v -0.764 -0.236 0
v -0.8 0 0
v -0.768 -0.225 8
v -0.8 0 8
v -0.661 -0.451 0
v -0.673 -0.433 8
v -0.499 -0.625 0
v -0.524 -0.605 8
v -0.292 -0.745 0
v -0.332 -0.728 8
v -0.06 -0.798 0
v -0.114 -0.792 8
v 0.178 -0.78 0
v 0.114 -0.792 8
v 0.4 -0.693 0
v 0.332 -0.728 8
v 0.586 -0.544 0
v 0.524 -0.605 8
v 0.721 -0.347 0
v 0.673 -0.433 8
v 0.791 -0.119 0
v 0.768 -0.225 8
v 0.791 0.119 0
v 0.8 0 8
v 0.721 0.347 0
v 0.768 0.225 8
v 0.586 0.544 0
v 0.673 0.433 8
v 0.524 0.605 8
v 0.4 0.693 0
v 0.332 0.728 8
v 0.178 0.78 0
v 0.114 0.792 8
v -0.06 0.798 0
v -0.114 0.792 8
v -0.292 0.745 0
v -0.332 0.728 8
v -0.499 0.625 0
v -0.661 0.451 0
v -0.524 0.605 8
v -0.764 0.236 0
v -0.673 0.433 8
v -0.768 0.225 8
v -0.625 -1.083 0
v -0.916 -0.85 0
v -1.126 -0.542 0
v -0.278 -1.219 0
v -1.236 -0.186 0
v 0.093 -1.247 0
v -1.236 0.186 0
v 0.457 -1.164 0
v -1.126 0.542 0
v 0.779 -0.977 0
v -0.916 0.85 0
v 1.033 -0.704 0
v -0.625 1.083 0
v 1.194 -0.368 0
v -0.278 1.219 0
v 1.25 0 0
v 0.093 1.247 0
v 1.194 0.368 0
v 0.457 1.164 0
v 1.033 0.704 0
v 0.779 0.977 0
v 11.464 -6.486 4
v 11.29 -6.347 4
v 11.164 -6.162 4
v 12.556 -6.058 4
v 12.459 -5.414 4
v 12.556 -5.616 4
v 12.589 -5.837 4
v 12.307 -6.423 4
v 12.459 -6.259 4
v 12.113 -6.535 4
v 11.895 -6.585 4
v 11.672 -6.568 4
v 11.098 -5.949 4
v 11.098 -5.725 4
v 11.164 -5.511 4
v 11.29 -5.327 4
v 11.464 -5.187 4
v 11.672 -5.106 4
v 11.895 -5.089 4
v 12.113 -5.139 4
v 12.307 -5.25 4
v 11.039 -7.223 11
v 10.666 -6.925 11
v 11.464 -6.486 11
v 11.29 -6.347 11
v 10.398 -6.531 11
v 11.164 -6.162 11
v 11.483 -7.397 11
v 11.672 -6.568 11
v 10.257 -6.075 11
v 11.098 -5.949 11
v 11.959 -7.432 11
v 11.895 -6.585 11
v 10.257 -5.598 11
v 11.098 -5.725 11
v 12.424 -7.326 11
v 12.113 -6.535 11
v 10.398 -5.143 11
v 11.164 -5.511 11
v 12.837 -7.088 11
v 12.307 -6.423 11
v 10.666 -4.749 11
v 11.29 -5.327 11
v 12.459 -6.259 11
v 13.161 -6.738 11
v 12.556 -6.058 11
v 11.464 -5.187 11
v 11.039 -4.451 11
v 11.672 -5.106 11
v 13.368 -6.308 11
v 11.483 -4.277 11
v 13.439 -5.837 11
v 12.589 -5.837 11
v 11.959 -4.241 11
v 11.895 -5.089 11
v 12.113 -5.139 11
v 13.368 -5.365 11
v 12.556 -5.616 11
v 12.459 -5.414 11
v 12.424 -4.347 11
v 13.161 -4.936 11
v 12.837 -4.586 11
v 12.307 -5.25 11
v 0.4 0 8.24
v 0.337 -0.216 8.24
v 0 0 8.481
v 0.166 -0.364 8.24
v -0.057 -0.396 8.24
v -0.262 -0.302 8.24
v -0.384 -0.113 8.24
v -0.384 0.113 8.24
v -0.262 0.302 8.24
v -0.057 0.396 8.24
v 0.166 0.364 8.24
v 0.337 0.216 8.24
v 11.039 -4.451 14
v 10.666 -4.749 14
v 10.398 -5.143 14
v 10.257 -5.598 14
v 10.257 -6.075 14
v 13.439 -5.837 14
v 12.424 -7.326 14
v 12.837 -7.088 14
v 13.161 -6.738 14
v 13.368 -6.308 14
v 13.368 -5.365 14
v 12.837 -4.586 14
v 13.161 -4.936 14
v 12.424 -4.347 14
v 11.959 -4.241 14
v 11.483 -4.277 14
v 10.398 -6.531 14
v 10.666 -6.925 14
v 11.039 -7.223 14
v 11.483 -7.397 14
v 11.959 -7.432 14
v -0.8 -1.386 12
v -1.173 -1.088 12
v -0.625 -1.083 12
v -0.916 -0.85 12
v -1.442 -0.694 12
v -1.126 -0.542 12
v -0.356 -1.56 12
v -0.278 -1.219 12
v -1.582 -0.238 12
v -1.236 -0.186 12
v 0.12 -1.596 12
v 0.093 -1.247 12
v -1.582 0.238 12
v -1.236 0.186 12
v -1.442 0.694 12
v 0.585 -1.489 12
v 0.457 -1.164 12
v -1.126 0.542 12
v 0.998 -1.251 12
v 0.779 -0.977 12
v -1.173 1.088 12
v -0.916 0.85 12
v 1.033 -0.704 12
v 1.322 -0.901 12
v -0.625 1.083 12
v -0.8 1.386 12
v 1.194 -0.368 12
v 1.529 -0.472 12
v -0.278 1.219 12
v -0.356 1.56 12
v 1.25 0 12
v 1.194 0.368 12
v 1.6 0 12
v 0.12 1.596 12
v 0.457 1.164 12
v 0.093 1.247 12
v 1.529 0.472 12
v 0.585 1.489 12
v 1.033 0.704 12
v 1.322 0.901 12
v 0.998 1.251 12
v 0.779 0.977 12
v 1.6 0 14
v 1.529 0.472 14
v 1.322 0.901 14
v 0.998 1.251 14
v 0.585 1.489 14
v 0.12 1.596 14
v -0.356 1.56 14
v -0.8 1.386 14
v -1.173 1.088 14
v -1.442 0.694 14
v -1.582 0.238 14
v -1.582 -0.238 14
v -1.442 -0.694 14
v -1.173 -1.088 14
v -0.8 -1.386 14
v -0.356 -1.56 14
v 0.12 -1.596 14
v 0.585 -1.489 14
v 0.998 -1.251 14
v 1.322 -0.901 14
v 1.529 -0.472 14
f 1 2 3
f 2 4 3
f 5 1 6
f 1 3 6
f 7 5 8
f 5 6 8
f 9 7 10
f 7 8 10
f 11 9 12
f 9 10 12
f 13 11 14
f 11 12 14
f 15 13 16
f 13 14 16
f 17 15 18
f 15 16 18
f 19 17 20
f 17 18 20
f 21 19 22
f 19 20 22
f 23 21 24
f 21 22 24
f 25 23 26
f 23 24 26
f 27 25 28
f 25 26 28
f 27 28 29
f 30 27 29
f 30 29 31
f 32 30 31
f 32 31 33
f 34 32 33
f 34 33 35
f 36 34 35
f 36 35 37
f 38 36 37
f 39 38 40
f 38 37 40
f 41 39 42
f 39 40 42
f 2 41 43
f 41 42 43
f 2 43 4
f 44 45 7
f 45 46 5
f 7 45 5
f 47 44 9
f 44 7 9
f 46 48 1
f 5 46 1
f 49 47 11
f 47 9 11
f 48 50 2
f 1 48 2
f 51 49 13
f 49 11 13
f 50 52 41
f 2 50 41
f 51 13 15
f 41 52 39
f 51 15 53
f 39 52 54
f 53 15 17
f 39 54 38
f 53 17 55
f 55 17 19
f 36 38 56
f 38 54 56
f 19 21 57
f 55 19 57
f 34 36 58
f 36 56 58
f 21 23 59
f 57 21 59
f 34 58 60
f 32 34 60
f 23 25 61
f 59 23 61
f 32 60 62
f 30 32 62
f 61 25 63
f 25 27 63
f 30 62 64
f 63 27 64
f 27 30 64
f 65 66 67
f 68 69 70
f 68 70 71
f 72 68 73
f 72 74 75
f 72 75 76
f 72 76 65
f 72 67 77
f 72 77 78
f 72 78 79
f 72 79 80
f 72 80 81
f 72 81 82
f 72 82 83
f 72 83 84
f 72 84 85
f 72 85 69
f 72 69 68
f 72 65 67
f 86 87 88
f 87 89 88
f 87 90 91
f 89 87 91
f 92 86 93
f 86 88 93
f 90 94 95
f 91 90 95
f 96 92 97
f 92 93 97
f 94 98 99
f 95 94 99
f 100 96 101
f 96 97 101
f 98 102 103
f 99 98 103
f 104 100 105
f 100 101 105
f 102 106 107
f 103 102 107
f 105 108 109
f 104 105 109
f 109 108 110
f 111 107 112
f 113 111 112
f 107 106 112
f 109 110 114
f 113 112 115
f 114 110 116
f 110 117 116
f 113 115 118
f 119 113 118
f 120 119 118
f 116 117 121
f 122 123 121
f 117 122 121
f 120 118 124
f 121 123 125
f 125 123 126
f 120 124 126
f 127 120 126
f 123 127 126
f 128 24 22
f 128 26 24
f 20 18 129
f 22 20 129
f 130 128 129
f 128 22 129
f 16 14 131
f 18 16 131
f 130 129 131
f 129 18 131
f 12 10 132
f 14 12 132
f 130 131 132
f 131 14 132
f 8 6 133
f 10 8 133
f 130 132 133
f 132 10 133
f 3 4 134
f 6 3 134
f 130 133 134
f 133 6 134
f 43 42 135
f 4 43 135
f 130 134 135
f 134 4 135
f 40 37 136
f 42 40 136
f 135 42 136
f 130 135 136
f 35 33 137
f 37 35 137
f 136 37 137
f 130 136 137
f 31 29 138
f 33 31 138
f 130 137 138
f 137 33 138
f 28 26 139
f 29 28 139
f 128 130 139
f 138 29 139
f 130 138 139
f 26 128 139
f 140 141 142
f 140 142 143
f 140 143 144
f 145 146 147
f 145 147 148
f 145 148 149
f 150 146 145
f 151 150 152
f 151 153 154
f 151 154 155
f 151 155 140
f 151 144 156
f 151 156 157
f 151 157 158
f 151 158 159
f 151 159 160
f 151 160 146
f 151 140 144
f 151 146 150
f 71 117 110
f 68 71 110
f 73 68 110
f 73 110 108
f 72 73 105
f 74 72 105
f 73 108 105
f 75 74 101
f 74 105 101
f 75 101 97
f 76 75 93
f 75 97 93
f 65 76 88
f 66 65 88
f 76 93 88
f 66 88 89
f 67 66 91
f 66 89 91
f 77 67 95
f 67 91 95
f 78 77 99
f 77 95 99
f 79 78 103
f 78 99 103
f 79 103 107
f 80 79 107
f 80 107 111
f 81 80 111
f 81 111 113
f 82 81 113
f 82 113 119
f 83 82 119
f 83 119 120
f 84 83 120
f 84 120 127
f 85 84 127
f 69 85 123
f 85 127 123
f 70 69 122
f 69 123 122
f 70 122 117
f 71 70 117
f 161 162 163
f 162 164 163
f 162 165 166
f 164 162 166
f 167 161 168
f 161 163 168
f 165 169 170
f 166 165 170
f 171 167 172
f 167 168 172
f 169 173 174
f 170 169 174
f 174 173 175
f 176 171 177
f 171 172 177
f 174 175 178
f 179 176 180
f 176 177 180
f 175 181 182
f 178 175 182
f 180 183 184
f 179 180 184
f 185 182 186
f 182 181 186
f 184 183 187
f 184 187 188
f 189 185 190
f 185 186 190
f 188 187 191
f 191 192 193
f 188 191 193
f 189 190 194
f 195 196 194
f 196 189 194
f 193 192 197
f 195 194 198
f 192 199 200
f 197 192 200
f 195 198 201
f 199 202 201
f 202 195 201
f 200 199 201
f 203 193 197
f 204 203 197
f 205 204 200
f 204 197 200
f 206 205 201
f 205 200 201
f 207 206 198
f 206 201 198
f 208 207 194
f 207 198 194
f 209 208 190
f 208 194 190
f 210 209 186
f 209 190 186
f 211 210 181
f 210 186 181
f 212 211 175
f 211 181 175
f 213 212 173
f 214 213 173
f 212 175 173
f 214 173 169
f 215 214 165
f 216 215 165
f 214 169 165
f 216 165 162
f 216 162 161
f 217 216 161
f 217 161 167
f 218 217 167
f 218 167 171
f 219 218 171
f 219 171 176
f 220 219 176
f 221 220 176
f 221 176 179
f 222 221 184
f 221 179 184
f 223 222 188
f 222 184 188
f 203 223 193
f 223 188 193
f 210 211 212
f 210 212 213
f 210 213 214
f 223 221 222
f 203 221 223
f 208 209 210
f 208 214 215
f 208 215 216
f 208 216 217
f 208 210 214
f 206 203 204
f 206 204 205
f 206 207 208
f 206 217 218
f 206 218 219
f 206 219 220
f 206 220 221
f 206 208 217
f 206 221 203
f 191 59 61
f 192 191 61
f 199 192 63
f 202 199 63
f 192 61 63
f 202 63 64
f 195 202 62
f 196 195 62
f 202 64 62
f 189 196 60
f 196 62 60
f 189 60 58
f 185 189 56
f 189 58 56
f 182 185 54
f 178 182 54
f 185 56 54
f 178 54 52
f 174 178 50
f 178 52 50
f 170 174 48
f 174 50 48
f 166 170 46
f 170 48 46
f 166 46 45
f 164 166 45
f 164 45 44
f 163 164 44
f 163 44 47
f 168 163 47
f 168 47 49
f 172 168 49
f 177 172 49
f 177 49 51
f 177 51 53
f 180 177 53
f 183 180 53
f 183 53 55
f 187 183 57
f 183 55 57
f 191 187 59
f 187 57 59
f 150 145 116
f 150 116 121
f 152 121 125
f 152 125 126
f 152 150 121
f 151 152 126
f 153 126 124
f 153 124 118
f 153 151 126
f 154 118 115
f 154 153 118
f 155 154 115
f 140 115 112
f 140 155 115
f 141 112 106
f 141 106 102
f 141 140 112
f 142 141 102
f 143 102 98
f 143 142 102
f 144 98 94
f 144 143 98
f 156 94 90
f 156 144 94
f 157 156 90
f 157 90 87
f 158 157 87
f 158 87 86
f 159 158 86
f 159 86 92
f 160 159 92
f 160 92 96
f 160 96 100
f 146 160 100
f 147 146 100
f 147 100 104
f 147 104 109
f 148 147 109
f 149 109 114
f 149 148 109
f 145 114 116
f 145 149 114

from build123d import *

# Parameters (mm, degrees)
F0_R     = 1.25
F1_DEPTH = 12
F2_R     = 1.6
F3_DEPTH = 2
F5_D     = 1.6
F5_DEPTH = 8
F5_TIP   = 0.4806884952
F6_R     = 1.6
F7_DEPTH = 3
F8_R     = 0.75
F9_DEPTH = 7


with BuildPart() as f1:
    # F0 (on Top) → F1 (new body)
    with BuildSketch(Plane.XY):
        Circle(F0_R)
    extrude(amount=F1_DEPTH)

    # F2 (on face) → F3 (join)
    with BuildSketch(Plane.XY.offset(12)):
        Circle(F2_R)
    extrude(amount=F3_DEPTH)

    # F5
    with Locations(Plane(origin=(0, 0, 0), x_dir=(1, 0, 0), z_dir=(0, 0, -1))):
        with Locations((0, 0)):
            Hole(F5_D / 2, depth=F5_DEPTH)
            with Locations((0, 0, -(F5_DEPTH + F5_TIP / 2))):  # 118° drill point
                Cone(0, F5_D / 2, F5_TIP, mode=Mode.SUBTRACT)


with BuildPart() as f7:
    # F6 (on face) → F7 (new body)
    with BuildSketch(Plane.XY.offset(14)):
        with Locations((11.8393795413, -5.8368734847)):
            Circle(F6_R)
    extrude(amount=-F7_DEPTH)

    # F8 (on face) → F9 (join)
    with BuildSketch(Plane(origin=(0, 0, 11), x_dir=(1, 0, 0), z_dir=(0, 0, -1))):
        with Locations((11.8393795413, 5.8368734847)):
            Circle(F8_R)
    extrude(amount=F9_DEPTH)


solid = Compound([f1.part, f7.part])
